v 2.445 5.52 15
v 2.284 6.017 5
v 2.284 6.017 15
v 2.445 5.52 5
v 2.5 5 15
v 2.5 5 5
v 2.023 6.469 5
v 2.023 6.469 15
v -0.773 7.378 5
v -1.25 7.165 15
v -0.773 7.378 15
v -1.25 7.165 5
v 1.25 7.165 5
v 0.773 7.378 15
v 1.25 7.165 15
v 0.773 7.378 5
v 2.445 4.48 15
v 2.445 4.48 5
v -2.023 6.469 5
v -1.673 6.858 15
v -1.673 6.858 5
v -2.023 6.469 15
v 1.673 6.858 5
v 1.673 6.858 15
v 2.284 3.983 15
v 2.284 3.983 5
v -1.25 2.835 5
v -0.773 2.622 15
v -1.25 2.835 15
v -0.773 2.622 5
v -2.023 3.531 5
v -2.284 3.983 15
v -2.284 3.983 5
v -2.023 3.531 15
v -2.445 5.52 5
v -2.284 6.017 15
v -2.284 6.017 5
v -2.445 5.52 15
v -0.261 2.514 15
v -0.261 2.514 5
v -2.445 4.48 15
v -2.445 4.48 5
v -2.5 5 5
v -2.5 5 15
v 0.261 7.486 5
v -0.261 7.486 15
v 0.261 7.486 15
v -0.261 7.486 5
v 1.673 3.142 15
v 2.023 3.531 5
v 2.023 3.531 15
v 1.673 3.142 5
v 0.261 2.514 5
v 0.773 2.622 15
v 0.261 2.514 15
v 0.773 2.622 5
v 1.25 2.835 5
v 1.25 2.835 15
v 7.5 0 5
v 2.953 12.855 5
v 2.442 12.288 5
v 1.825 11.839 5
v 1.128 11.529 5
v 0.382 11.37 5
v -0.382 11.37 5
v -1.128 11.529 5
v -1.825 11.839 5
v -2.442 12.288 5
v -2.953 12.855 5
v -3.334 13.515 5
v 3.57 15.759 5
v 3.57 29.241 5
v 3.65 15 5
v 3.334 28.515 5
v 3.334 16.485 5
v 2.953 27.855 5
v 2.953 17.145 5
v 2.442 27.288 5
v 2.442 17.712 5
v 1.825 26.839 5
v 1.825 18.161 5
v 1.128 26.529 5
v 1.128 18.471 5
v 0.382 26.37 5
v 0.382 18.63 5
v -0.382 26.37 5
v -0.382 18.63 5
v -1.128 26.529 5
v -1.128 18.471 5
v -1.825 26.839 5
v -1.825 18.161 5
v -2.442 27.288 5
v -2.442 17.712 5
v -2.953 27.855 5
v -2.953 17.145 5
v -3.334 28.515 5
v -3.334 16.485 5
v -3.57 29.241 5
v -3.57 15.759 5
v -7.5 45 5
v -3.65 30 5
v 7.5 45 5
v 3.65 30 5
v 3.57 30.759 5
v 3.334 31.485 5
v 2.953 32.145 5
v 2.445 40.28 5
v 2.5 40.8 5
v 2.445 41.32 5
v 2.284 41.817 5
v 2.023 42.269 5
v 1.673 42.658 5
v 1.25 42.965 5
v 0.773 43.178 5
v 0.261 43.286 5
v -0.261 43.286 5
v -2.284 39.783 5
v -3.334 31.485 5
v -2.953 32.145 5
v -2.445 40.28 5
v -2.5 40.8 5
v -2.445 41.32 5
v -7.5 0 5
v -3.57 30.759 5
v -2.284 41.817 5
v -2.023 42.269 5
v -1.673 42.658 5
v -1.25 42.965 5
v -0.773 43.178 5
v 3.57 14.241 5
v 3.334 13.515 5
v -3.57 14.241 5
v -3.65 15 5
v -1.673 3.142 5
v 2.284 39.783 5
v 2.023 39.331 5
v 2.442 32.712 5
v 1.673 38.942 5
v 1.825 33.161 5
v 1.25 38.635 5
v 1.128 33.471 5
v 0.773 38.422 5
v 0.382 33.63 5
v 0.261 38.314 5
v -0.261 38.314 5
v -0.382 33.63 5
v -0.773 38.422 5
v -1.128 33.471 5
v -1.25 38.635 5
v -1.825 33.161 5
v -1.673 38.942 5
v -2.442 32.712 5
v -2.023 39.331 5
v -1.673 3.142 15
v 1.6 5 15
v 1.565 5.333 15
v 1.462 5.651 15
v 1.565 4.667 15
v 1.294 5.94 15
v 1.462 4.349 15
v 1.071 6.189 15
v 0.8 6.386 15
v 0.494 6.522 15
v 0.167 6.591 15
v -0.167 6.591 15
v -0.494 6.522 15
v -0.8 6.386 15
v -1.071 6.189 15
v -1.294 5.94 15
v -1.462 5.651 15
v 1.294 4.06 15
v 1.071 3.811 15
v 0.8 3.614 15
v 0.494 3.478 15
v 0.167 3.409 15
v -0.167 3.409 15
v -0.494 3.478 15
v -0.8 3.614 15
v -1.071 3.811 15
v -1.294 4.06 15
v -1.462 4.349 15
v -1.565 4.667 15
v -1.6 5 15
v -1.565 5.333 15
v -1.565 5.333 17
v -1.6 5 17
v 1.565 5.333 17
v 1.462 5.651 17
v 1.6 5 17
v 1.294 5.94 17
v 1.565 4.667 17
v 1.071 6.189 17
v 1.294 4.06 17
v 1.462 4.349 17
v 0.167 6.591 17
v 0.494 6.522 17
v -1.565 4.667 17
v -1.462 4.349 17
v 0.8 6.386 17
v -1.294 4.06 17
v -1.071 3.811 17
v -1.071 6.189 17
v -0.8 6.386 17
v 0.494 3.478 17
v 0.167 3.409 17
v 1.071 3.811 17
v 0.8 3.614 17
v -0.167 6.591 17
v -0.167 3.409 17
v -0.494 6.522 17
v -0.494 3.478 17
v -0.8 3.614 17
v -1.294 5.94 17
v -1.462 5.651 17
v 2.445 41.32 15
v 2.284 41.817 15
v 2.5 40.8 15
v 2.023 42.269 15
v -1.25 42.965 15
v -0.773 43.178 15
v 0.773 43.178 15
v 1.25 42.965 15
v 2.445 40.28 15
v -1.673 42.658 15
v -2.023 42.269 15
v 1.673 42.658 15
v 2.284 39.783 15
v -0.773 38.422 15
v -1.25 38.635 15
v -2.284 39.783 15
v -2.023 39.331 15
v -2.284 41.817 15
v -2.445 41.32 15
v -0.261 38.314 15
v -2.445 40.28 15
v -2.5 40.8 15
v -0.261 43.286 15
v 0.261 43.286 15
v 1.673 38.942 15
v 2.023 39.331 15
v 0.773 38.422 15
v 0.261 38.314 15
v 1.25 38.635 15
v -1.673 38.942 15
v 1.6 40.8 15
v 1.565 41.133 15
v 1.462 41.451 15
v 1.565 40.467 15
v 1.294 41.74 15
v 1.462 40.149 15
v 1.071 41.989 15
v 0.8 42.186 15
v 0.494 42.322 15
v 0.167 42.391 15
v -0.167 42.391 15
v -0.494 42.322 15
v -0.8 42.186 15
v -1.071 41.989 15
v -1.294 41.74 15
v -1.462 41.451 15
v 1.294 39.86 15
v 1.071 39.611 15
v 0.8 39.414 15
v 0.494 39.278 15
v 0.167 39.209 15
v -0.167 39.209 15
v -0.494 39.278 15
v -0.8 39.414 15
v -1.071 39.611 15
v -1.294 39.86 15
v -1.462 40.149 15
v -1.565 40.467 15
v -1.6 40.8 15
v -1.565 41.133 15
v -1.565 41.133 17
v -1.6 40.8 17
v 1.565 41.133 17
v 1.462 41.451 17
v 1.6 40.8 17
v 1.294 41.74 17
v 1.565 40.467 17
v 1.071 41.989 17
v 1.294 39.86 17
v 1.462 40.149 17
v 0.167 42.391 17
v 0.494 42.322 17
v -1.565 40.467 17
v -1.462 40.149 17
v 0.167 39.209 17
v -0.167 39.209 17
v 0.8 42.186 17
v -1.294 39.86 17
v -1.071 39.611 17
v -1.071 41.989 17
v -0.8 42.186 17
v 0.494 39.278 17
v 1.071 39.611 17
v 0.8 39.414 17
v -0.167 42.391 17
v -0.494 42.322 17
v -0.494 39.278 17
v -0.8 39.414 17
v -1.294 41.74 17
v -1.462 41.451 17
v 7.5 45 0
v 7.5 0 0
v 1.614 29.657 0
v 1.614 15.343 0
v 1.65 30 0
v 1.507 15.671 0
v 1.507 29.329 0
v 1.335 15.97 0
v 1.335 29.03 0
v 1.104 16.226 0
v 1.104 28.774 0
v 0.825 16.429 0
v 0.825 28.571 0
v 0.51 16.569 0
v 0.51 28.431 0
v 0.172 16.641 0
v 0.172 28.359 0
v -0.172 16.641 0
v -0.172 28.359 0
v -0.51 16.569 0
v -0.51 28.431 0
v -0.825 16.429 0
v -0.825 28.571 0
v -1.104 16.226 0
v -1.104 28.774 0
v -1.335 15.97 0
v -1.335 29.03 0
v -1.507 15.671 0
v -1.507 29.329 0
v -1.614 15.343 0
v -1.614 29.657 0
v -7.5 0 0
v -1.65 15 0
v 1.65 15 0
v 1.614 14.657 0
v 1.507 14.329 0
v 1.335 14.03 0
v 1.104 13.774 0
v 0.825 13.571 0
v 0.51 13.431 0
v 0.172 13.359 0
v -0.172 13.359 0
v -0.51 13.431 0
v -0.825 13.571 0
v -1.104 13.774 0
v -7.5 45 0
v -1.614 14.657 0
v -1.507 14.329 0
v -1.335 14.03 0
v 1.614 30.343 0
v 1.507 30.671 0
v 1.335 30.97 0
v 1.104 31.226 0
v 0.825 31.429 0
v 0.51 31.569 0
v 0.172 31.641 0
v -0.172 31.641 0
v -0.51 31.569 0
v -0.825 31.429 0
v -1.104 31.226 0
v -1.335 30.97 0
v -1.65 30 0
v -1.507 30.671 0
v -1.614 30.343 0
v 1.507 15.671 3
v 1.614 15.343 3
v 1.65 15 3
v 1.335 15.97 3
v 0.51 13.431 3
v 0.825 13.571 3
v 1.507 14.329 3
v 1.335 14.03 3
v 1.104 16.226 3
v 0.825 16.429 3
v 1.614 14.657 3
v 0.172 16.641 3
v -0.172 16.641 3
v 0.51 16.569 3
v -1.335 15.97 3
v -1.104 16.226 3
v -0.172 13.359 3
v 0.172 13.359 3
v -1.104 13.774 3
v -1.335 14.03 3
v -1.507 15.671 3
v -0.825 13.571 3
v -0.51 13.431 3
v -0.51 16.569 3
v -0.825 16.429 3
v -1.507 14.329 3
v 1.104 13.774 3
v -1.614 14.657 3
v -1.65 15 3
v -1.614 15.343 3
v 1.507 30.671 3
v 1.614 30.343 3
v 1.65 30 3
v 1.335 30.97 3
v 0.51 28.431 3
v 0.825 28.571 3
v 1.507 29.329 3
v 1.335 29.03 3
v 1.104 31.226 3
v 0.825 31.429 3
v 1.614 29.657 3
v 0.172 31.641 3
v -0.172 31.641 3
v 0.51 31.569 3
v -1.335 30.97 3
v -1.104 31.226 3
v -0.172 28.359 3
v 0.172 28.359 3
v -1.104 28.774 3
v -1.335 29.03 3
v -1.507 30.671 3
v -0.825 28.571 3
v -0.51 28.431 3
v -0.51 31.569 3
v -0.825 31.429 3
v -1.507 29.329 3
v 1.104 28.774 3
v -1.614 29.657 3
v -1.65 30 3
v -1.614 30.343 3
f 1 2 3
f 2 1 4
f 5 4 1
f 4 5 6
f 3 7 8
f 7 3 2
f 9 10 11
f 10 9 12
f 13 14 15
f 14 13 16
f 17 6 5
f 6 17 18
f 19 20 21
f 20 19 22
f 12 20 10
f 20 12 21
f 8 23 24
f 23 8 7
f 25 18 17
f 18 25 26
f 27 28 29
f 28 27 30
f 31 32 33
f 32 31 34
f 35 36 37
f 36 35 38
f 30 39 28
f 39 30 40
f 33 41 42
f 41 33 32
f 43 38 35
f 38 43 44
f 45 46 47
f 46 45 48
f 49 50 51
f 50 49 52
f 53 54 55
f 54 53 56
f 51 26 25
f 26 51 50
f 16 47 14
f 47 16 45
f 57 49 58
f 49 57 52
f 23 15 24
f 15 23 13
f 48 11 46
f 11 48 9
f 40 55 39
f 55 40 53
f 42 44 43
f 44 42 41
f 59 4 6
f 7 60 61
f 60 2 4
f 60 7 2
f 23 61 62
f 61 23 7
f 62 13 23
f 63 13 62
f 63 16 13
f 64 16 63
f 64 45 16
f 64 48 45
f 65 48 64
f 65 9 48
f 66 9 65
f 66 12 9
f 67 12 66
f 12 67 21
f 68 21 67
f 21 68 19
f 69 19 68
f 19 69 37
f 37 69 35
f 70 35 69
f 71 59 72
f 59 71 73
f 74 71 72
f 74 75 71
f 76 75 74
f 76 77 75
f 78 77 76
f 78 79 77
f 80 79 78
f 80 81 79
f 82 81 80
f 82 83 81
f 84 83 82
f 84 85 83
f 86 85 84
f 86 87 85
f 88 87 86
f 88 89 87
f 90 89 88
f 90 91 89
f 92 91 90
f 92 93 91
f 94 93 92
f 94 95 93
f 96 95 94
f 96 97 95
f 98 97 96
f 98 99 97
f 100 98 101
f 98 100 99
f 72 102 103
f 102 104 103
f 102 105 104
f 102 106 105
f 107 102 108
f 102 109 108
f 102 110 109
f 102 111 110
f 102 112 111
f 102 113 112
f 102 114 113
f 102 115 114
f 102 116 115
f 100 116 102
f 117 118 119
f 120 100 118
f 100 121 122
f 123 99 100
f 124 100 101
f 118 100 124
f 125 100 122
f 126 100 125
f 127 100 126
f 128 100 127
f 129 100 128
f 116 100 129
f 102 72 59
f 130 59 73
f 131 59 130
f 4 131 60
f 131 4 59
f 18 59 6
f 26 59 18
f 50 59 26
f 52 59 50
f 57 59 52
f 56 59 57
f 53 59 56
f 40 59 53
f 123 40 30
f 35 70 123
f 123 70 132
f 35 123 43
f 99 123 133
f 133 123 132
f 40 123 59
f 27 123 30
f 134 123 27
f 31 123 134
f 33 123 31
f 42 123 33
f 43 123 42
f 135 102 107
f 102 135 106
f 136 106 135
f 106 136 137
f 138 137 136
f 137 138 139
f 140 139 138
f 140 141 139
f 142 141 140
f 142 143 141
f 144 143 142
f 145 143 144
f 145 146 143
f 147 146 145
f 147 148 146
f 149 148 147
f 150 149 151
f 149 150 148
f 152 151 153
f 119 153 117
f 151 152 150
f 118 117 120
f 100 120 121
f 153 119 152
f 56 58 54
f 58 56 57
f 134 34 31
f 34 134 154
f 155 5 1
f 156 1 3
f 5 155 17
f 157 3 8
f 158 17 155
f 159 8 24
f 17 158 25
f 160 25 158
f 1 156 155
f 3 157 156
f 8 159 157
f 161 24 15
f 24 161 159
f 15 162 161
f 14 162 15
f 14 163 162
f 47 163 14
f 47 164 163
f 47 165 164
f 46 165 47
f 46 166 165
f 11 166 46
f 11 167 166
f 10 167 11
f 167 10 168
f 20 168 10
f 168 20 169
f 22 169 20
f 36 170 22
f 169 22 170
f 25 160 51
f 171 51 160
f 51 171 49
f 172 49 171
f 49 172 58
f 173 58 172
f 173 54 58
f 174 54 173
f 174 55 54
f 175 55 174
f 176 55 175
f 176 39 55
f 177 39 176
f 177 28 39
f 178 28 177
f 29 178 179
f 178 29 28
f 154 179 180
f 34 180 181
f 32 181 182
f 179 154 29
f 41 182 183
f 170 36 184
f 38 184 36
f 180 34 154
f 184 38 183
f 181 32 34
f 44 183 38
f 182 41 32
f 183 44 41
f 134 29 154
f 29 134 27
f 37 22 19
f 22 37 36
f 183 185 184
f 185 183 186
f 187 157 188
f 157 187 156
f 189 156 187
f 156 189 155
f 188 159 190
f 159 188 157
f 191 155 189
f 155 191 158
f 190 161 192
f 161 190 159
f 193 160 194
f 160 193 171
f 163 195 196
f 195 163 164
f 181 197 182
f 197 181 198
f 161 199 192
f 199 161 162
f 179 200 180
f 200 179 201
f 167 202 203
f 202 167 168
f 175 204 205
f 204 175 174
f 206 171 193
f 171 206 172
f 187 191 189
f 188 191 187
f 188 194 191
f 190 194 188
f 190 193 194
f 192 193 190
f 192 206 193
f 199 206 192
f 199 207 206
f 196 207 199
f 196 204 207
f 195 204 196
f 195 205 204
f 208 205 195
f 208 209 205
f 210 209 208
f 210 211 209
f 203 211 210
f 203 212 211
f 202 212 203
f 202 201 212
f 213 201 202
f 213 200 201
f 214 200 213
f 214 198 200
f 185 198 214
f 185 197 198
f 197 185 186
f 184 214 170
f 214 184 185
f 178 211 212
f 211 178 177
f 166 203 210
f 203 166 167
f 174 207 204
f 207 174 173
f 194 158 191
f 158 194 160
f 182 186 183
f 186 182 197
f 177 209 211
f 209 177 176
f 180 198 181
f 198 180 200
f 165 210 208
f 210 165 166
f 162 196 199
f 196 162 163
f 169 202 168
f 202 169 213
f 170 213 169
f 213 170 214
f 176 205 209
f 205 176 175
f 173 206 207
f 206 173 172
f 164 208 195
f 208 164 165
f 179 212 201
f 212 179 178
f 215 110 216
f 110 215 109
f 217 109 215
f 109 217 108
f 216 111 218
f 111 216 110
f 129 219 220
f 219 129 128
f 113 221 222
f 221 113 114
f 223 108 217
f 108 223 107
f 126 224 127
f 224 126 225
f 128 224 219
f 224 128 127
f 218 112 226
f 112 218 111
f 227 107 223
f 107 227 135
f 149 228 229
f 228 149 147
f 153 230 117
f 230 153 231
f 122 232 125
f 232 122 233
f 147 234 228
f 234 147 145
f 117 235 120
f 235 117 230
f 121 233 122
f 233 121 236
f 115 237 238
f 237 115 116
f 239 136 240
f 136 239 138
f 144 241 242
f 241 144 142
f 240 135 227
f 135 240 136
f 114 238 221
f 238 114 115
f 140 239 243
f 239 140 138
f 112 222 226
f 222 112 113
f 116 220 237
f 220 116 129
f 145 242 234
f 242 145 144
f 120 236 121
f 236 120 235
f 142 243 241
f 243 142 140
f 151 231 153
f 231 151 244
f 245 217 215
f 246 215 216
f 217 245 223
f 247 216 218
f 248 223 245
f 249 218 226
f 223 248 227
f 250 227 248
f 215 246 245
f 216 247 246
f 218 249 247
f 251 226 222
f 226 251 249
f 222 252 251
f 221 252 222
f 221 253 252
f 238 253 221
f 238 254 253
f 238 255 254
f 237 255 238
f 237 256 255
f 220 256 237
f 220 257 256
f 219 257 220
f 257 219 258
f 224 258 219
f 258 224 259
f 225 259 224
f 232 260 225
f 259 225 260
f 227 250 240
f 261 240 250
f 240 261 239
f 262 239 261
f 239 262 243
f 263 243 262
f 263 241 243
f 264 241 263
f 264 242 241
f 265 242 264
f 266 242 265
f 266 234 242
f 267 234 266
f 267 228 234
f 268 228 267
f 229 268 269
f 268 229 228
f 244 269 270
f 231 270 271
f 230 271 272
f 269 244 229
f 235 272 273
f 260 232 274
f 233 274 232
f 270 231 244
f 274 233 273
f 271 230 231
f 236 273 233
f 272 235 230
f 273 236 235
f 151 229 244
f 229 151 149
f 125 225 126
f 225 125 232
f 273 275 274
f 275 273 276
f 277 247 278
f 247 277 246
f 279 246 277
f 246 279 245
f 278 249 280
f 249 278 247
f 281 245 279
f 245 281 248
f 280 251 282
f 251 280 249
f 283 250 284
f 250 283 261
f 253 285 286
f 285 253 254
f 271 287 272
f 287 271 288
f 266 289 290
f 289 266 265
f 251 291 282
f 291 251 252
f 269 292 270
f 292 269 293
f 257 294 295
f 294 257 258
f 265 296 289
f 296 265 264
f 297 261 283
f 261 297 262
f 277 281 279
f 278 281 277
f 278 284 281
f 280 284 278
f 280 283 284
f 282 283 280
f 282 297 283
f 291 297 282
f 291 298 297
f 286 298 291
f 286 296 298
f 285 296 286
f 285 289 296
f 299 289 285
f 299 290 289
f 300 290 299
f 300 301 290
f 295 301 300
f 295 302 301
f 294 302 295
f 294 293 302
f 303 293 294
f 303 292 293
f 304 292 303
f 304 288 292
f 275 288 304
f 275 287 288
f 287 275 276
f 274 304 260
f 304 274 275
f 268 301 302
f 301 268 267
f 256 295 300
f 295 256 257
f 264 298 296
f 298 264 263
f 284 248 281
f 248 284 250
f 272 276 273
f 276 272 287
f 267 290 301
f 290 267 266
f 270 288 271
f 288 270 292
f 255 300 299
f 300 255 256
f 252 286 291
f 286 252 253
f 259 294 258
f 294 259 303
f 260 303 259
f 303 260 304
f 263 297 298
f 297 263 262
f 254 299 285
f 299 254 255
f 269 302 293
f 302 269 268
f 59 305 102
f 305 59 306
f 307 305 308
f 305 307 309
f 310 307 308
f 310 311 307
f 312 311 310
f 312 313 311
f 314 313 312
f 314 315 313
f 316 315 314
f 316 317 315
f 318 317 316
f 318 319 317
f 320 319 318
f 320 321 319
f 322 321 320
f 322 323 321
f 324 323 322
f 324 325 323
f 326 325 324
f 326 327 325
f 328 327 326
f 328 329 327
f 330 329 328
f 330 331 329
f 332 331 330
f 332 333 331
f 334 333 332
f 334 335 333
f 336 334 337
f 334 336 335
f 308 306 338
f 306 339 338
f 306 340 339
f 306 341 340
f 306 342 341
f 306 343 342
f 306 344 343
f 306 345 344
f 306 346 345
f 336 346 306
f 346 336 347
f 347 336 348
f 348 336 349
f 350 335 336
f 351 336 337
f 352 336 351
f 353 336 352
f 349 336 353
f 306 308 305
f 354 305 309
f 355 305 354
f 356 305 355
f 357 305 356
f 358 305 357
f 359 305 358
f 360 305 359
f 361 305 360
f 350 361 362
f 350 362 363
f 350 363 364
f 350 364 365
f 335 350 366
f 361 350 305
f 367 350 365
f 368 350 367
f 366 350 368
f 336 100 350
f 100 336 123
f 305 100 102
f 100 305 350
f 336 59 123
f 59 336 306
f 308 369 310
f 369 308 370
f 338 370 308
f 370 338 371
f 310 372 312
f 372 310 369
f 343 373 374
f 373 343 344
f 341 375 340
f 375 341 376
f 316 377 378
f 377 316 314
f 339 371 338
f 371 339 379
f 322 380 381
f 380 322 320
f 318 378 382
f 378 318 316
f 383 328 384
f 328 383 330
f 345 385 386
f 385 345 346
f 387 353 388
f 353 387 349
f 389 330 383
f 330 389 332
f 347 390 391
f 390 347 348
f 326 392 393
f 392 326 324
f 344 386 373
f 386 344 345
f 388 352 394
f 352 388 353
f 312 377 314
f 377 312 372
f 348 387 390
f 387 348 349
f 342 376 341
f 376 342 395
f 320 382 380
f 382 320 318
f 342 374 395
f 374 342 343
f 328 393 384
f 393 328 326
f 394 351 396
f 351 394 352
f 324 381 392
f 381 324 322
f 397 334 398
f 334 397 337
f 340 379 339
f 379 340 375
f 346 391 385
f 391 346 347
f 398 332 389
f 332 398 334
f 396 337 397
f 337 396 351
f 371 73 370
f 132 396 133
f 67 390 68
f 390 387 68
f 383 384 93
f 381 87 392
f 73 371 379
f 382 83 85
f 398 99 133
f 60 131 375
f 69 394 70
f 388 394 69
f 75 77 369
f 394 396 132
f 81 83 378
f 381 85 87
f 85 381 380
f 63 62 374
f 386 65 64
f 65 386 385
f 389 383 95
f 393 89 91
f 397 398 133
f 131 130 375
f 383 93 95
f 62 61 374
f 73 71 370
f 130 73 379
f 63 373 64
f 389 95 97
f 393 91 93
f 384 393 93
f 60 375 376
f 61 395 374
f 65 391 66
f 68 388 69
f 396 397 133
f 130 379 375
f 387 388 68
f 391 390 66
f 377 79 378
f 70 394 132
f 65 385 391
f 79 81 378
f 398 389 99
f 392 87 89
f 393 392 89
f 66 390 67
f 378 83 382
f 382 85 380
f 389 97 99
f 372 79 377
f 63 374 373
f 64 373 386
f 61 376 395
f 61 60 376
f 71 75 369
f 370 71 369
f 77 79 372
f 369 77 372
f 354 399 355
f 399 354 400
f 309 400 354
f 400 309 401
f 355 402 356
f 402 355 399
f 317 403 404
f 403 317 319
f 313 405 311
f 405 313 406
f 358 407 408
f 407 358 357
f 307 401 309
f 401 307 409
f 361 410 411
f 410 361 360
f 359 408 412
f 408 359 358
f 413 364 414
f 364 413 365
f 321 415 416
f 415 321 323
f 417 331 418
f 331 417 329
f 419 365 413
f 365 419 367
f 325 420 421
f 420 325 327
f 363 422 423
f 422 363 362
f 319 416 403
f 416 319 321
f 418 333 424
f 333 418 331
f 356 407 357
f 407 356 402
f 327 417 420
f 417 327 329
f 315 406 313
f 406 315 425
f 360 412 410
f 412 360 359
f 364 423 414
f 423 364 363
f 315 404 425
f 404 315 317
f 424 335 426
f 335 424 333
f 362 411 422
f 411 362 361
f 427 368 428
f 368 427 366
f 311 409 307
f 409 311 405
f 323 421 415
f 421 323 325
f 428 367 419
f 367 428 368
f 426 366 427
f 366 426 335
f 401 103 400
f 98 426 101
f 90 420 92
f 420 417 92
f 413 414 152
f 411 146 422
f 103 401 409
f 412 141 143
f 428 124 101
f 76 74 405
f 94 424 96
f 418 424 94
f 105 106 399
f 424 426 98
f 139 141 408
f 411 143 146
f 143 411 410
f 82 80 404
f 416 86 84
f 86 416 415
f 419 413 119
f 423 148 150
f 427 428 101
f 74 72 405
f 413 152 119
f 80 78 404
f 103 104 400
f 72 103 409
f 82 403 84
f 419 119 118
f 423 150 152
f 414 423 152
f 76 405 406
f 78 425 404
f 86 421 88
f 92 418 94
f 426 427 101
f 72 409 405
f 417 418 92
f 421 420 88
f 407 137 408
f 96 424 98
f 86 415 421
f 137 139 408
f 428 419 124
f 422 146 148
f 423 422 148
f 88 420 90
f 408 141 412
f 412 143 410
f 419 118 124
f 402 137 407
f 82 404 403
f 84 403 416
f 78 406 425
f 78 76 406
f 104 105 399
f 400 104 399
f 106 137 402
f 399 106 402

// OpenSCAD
// Screwless mount for a perfborad:
// Adafruit Perma-Proto Quarter-sized Breadboard PCB 

$fn=30; // Number of facets

bh=5; // base height
d=35.8;
module spacer(x=0, y=0, z=0){
    translate([x,y,z]){
        cylinder(d=5, h=10);
        cylinder(d=3.2, h=12);
    }
    }

spacer(0, 5, bh);
spacer(0, 5+d, bh);

bx = 15;
by = 45;
    
// Draw base
module base() {
    translate([-bx/2,0,0]){
    cube([bx, by, bh]);
    }
}

// Mounting holes
// #6 screw = 3.3mm diameter
difference(){
    base();
    // first hole
    translate([0, by/3, 0]){
    cylinder(d=3.3, h=bh);
    }
    chamfer(0, by/3, bh-2);
    // second hole
    translate([0, 2*by/3, 0]){
    cylinder(d=3.3, h=bh);
    }
    chamfer(0, 2*by/3, bh-2);
}

module chamfer(x,y,z,cd=3.3, cw=2){
    // x, y, z = center coordinates of chamfer
    // cd: chamfer smallest diameter
    // cw: width of chamfer.  
    color("red")
    translate([x, y, z]){
    cylinder(d1=cd, d2=cd+2*cw, h=cw);
    }
}
